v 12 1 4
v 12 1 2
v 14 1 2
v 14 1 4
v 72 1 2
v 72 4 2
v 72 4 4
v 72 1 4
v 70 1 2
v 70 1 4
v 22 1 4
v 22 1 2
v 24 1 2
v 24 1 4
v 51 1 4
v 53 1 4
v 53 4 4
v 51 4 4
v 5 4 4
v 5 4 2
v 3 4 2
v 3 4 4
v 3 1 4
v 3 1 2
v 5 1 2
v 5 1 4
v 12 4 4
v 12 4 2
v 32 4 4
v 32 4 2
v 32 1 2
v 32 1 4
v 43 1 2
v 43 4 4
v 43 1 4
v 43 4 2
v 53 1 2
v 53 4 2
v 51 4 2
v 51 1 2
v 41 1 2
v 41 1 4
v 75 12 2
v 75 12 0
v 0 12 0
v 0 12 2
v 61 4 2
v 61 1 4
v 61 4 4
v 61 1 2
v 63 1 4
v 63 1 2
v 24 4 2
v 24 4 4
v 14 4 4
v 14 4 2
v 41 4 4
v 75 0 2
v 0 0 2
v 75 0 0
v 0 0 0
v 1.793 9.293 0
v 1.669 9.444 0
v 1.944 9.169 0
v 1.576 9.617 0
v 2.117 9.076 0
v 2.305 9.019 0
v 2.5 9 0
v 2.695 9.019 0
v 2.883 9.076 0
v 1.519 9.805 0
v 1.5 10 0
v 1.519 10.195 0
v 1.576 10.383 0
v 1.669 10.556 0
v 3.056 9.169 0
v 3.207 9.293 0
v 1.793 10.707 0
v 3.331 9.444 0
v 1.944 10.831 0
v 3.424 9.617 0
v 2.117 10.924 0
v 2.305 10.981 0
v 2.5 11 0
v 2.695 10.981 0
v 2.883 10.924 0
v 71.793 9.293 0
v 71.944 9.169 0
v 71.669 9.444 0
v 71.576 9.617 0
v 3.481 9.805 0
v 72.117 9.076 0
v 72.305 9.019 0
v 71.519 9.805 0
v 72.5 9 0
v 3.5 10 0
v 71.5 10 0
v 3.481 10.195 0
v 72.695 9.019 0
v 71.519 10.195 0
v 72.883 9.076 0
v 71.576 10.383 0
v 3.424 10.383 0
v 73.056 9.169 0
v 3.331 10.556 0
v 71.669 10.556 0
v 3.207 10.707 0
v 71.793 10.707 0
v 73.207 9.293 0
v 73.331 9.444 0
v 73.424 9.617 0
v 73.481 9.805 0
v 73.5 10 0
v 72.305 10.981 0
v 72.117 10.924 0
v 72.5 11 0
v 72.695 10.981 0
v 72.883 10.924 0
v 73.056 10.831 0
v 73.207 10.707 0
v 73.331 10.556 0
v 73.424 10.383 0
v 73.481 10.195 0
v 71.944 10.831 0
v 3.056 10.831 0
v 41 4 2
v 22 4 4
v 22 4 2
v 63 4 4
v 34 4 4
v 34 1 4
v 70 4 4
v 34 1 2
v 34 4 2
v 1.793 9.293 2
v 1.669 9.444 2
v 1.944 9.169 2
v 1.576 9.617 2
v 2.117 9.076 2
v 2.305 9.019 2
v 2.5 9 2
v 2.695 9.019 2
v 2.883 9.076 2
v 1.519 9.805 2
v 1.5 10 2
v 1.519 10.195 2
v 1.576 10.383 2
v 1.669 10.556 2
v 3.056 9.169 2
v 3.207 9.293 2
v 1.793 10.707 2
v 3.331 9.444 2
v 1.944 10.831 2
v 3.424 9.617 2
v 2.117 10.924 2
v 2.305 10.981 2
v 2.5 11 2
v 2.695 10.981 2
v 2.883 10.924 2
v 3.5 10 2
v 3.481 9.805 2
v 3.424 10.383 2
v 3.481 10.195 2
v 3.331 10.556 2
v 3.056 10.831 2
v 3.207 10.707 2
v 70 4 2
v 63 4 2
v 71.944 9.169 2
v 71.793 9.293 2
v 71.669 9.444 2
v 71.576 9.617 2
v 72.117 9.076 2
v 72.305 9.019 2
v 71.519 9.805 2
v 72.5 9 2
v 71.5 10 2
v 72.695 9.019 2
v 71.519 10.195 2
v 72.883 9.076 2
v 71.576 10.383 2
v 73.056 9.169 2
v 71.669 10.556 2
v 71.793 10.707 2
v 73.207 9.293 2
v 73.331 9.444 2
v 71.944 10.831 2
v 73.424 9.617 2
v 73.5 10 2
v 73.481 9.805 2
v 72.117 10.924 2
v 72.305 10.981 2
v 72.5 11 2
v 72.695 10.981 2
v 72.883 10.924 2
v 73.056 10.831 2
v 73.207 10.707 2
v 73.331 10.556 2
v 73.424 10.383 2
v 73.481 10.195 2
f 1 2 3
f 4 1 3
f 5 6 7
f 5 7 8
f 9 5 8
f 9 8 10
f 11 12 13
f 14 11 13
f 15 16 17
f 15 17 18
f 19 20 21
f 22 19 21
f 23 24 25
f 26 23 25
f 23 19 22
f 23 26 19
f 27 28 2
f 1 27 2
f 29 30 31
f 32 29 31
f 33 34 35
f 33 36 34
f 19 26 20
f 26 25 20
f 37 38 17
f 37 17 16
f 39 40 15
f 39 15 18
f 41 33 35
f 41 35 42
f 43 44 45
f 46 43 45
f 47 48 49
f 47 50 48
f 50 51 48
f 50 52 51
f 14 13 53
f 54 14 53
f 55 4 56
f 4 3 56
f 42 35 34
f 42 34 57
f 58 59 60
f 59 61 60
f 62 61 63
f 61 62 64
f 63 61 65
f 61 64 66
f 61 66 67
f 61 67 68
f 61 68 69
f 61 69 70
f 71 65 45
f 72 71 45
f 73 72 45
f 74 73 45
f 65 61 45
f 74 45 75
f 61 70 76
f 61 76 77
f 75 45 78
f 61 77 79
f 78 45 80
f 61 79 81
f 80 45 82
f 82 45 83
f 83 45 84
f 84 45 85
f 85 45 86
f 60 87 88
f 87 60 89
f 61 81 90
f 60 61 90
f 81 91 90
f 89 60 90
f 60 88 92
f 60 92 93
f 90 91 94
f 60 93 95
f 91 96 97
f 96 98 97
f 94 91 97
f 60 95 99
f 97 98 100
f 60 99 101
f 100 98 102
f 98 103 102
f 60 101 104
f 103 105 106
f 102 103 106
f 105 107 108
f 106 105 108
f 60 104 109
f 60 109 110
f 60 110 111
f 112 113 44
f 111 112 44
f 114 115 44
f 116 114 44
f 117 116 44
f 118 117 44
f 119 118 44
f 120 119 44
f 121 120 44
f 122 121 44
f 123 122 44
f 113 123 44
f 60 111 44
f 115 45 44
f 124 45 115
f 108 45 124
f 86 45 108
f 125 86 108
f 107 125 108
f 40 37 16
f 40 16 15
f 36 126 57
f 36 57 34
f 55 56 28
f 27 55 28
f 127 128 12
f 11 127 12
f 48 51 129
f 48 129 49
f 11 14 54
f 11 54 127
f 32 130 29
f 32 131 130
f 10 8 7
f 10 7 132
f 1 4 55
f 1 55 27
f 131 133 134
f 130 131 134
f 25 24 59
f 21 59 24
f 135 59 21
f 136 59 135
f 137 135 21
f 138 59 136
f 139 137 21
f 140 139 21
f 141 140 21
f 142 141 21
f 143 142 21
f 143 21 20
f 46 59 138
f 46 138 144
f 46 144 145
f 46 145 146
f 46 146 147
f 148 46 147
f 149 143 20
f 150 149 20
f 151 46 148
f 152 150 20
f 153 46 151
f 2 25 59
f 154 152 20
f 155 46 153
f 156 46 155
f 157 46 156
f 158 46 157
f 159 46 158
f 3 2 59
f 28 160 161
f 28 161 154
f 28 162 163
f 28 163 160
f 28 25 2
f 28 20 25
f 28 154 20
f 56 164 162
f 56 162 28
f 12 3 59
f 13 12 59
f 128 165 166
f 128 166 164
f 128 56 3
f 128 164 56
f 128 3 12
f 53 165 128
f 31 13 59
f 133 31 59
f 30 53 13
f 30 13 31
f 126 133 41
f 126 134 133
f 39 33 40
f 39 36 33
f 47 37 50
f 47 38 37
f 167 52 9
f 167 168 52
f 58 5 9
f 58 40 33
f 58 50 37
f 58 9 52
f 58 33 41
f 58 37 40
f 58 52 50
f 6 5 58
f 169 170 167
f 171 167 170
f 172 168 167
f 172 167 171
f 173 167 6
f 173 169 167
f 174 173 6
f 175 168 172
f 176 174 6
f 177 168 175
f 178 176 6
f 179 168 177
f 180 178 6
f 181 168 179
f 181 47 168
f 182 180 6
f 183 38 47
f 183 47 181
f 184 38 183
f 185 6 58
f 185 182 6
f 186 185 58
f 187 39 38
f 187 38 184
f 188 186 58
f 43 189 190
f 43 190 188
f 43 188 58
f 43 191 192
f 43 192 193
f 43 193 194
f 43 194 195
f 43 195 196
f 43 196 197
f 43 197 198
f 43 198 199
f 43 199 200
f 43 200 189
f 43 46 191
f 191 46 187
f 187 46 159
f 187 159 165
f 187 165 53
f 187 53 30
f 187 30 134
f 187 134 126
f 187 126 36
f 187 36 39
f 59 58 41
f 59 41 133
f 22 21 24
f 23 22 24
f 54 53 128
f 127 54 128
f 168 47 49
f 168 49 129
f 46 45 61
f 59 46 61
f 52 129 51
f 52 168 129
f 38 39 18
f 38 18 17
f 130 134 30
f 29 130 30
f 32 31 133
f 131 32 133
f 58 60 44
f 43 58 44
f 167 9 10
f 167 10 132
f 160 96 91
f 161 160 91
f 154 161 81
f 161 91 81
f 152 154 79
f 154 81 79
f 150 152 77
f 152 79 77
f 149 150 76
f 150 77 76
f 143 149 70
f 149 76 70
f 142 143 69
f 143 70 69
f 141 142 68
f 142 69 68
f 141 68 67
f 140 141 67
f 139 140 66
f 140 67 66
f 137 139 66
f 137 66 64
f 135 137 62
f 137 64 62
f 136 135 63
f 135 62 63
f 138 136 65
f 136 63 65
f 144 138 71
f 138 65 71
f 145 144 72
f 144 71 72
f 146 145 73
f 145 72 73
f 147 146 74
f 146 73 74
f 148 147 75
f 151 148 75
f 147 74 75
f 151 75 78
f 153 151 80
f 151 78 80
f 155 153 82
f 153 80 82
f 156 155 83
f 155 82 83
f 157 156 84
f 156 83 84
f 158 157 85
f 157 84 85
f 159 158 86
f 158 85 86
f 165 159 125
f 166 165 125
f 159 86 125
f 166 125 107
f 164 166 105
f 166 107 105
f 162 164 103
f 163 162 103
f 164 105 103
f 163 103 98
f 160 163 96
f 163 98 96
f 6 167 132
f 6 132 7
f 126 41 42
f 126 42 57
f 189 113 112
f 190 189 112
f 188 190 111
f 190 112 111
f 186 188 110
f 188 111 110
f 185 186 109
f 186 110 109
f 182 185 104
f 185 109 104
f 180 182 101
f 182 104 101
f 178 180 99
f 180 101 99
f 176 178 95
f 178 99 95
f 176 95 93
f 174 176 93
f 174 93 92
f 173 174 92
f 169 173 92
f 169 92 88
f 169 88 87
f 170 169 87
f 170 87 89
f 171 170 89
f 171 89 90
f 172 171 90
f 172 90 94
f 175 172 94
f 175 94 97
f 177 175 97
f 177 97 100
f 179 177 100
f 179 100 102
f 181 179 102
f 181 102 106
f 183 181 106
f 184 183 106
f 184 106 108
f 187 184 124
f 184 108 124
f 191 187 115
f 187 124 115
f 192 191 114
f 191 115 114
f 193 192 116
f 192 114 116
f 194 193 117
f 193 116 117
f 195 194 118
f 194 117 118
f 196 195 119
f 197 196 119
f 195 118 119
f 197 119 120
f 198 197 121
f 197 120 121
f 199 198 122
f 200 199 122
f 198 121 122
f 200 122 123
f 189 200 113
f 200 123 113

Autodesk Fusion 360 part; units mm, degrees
sketch "Szkic1" plane through (0, 0, 0) normal (0, 0, 1) x (1, 0, 0)
  line L0 (0, 0) -> (75, 0)
  line L1 (75, 0) -> (75, 12)
  line L2 (75, 12) -> (0, 12)
  line L3 (0, 12) -> (0, 0)
  dimension "d1" = 75
  dimension "d2" = 12
extrude "Wyciągnięcie proste1" add sketch "Szkic1" along normal blind 2
sketch "Szkic2" plane through (0, 0, 2) normal (0, 0, 1) x (-1, 0, 0)
  line L0 (0, -12) -> (0, 0)
  line L1 (0, 0) -> (-75, 0)
  line L2 (-75, 0) -> (-75, -12)
  line L3 (-75, -12) -> (0, -12)
  line L4 (-3, -1) -> (-5, -1)
  line L5 (-5, -1) -> (-5, -4)
  line L6 (-5, -4) -> (-3, -4)
  line L7 (-3, -4) -> (-3, -1)
  line L8 (-72, -1) -> (-70, -1)
  line L9 (-70, -1) -> (-70, -4)
  line L10 (-70, -4) -> (-72, -4)
  line L11 (-72, -4) -> (-72, -1)
  line L12 (-12, -1) -> (-14, -1)
  line L13 (-14, -1) -> (-14, -4)
  line L14 (-14, -4) -> (-12, -4)
  line L15 (-12, -4) -> (-12, -1)
  line L16 (-63, -1) -> (-61, -1)
  line L17 (-61, -1) -> (-61, -4)
  line L18 (-61, -4) -> (-63, -4)
  line L19 (-63, -4) -> (-63, -1)
  line L20 (-22, -1) -> (-24, -1)
  line L21 (-24, -1) -> (-24, -4)
  line L22 (-24, -4) -> (-22, -4)
  line L23 (-22, -4) -> (-22, -1)
  line L24 (-53, -1) -> (-51, -1)
  line L25 (-51, -1) -> (-51, -4)
  line L26 (-51, -4) -> (-53, -4)
  line L27 (-53, -4) -> (-53, -1)
  line L28 (-32, -1) -> (-34, -1)
  line L29 (-34, -1) -> (-34, -4)
  line L30 (-34, -4) -> (-32, -4)
  line L31 (-32, -4) -> (-32, -1)
  line L32 (-43, -1) -> (-41, -1)
  line L33 (-41, -1) -> (-41, -4)
  line L34 (-41, -4) -> (-43, -4)
  line L35 (-43, -4) -> (-43, -1)
extrude "Wyciągnięcie proste2" add sketch "Szkic2" along normal blind 2 contours L4 L5 L6 L7 | L8 L9 L10 L11 | L12 L13 L14 L15 | L16 L17 L18 L19 | L20 L21 L22 L23 | L24 L25 L26 L27 | L28 L29 L30 L31 | L32 L33 L34 L35
sketch "Szkic3" plane through (0, 0, 0) normal (0, 0, -1) x (1, 0, 0)
  line L0 (0, 0) -> (0, -12)
  line L1 (0, -12) -> (75, -12)
  line L2 (75, -12) -> (75, 0)
  line L3 (75, 0) -> (0, 0)
  circle A0 centre (2.5, -10) radius 1
  circle A1 centre (72.5, -10) radius 1
  dimension "d8" = 2
  dimension "d9" = 2
extrude "Wyciągnięcie proste3" cut sketch "Szkic3" against normal blind 4 contours A0 | A1
